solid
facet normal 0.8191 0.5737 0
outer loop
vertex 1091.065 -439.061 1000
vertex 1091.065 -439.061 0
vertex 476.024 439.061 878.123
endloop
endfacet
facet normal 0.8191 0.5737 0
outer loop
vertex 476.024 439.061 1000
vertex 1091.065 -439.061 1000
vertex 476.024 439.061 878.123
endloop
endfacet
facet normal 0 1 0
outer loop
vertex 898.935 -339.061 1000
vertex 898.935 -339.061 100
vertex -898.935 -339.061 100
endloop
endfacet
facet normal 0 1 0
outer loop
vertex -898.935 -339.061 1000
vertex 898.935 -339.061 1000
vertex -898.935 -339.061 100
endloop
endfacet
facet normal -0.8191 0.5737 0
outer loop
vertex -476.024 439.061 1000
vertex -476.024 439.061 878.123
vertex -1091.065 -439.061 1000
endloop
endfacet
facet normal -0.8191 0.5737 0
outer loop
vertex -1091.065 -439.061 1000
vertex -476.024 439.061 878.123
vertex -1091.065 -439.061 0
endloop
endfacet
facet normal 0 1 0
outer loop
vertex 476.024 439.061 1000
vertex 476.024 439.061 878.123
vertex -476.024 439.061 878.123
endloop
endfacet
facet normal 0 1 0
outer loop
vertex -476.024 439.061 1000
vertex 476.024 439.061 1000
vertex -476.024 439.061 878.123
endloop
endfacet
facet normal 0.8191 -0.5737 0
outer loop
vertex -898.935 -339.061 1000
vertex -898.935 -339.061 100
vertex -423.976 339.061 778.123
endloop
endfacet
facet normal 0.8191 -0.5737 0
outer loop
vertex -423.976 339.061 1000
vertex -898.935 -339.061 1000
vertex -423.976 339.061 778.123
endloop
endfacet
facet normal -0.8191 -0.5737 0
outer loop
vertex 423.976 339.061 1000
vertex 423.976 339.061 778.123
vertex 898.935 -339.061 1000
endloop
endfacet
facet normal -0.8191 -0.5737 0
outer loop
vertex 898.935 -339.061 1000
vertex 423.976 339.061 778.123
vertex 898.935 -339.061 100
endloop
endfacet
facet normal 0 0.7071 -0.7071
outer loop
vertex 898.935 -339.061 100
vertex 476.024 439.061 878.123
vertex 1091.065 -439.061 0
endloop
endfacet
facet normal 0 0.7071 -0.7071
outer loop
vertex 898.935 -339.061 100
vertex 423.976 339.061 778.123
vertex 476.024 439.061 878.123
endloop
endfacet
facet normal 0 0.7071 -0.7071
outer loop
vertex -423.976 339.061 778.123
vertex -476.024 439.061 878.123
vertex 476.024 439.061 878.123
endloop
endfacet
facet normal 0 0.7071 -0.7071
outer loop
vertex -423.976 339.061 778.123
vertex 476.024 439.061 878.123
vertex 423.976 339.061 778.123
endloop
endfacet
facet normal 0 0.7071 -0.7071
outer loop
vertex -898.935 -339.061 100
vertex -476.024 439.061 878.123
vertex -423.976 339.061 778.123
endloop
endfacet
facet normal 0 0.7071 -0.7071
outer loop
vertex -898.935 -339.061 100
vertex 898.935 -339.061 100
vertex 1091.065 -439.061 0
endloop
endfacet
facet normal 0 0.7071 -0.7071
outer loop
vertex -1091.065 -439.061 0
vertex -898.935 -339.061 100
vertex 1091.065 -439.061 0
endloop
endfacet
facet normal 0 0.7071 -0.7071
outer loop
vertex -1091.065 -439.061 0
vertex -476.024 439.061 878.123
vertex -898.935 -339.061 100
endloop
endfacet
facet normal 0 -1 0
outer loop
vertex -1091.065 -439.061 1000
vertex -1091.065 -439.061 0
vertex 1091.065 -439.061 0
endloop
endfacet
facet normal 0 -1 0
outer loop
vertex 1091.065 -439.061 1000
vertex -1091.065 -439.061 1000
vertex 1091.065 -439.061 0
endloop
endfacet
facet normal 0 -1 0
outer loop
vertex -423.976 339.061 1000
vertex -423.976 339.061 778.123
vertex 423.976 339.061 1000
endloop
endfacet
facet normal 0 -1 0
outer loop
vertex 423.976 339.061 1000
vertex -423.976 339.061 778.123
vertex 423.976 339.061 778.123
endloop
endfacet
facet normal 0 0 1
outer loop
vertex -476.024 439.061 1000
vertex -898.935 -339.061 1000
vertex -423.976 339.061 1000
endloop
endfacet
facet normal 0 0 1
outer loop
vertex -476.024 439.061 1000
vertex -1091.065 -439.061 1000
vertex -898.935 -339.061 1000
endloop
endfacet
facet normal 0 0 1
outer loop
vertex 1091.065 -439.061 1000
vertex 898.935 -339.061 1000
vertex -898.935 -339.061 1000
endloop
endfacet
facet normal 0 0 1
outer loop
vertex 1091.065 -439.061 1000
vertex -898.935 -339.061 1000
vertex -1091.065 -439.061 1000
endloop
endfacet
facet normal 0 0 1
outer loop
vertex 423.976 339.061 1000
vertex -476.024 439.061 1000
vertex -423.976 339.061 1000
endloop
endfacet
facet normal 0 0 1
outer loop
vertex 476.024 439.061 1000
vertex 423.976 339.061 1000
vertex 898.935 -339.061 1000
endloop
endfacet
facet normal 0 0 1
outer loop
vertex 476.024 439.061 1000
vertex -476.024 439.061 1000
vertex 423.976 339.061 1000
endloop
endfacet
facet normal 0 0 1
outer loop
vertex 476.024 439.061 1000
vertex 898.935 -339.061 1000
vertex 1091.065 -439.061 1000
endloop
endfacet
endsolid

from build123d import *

# Parameters (mm, degrees)
F1_DEPTH      = 1000
F3_DEPTH      = 1091.0655359211
F3_DEPTH_BACK = 1091.0655359211


with BuildPart() as f1:
    # F0 (on Top) → F1 (new body)
    with BuildSketch(Plane.XY):
        Polygon((476.0241719385, 439.0613704803), (-476.0241719385, 439.0613704803), (-1091.0645359211, -439.0613704803), (1091.0645359211, -439.0613704803), align=None)
        Polygon((-898.9354640789, -339.0613704803), (-423.9758280615, 339.0613704803), (423.9758280615, 339.0613704803), (898.9354640789, -339.0613704803), align=None, mode=Mode.SUBTRACT)
    extrude(amount=F1_DEPTH)

    # F2 (on Right) → F3 (cut, two sides)
    with BuildSketch(Plane.YZ) as f3_sk:
        Polygon((-439.0613704803, 0), (439.0613704803, 0), (439.0613704803, 878.1227409606), align=None)
    extrude(amount=-F3_DEPTH, mode=Mode.SUBTRACT)
    extrude(f3_sk.sketch, amount=F3_DEPTH_BACK, mode=Mode.SUBTRACT)


solid = f1.part
